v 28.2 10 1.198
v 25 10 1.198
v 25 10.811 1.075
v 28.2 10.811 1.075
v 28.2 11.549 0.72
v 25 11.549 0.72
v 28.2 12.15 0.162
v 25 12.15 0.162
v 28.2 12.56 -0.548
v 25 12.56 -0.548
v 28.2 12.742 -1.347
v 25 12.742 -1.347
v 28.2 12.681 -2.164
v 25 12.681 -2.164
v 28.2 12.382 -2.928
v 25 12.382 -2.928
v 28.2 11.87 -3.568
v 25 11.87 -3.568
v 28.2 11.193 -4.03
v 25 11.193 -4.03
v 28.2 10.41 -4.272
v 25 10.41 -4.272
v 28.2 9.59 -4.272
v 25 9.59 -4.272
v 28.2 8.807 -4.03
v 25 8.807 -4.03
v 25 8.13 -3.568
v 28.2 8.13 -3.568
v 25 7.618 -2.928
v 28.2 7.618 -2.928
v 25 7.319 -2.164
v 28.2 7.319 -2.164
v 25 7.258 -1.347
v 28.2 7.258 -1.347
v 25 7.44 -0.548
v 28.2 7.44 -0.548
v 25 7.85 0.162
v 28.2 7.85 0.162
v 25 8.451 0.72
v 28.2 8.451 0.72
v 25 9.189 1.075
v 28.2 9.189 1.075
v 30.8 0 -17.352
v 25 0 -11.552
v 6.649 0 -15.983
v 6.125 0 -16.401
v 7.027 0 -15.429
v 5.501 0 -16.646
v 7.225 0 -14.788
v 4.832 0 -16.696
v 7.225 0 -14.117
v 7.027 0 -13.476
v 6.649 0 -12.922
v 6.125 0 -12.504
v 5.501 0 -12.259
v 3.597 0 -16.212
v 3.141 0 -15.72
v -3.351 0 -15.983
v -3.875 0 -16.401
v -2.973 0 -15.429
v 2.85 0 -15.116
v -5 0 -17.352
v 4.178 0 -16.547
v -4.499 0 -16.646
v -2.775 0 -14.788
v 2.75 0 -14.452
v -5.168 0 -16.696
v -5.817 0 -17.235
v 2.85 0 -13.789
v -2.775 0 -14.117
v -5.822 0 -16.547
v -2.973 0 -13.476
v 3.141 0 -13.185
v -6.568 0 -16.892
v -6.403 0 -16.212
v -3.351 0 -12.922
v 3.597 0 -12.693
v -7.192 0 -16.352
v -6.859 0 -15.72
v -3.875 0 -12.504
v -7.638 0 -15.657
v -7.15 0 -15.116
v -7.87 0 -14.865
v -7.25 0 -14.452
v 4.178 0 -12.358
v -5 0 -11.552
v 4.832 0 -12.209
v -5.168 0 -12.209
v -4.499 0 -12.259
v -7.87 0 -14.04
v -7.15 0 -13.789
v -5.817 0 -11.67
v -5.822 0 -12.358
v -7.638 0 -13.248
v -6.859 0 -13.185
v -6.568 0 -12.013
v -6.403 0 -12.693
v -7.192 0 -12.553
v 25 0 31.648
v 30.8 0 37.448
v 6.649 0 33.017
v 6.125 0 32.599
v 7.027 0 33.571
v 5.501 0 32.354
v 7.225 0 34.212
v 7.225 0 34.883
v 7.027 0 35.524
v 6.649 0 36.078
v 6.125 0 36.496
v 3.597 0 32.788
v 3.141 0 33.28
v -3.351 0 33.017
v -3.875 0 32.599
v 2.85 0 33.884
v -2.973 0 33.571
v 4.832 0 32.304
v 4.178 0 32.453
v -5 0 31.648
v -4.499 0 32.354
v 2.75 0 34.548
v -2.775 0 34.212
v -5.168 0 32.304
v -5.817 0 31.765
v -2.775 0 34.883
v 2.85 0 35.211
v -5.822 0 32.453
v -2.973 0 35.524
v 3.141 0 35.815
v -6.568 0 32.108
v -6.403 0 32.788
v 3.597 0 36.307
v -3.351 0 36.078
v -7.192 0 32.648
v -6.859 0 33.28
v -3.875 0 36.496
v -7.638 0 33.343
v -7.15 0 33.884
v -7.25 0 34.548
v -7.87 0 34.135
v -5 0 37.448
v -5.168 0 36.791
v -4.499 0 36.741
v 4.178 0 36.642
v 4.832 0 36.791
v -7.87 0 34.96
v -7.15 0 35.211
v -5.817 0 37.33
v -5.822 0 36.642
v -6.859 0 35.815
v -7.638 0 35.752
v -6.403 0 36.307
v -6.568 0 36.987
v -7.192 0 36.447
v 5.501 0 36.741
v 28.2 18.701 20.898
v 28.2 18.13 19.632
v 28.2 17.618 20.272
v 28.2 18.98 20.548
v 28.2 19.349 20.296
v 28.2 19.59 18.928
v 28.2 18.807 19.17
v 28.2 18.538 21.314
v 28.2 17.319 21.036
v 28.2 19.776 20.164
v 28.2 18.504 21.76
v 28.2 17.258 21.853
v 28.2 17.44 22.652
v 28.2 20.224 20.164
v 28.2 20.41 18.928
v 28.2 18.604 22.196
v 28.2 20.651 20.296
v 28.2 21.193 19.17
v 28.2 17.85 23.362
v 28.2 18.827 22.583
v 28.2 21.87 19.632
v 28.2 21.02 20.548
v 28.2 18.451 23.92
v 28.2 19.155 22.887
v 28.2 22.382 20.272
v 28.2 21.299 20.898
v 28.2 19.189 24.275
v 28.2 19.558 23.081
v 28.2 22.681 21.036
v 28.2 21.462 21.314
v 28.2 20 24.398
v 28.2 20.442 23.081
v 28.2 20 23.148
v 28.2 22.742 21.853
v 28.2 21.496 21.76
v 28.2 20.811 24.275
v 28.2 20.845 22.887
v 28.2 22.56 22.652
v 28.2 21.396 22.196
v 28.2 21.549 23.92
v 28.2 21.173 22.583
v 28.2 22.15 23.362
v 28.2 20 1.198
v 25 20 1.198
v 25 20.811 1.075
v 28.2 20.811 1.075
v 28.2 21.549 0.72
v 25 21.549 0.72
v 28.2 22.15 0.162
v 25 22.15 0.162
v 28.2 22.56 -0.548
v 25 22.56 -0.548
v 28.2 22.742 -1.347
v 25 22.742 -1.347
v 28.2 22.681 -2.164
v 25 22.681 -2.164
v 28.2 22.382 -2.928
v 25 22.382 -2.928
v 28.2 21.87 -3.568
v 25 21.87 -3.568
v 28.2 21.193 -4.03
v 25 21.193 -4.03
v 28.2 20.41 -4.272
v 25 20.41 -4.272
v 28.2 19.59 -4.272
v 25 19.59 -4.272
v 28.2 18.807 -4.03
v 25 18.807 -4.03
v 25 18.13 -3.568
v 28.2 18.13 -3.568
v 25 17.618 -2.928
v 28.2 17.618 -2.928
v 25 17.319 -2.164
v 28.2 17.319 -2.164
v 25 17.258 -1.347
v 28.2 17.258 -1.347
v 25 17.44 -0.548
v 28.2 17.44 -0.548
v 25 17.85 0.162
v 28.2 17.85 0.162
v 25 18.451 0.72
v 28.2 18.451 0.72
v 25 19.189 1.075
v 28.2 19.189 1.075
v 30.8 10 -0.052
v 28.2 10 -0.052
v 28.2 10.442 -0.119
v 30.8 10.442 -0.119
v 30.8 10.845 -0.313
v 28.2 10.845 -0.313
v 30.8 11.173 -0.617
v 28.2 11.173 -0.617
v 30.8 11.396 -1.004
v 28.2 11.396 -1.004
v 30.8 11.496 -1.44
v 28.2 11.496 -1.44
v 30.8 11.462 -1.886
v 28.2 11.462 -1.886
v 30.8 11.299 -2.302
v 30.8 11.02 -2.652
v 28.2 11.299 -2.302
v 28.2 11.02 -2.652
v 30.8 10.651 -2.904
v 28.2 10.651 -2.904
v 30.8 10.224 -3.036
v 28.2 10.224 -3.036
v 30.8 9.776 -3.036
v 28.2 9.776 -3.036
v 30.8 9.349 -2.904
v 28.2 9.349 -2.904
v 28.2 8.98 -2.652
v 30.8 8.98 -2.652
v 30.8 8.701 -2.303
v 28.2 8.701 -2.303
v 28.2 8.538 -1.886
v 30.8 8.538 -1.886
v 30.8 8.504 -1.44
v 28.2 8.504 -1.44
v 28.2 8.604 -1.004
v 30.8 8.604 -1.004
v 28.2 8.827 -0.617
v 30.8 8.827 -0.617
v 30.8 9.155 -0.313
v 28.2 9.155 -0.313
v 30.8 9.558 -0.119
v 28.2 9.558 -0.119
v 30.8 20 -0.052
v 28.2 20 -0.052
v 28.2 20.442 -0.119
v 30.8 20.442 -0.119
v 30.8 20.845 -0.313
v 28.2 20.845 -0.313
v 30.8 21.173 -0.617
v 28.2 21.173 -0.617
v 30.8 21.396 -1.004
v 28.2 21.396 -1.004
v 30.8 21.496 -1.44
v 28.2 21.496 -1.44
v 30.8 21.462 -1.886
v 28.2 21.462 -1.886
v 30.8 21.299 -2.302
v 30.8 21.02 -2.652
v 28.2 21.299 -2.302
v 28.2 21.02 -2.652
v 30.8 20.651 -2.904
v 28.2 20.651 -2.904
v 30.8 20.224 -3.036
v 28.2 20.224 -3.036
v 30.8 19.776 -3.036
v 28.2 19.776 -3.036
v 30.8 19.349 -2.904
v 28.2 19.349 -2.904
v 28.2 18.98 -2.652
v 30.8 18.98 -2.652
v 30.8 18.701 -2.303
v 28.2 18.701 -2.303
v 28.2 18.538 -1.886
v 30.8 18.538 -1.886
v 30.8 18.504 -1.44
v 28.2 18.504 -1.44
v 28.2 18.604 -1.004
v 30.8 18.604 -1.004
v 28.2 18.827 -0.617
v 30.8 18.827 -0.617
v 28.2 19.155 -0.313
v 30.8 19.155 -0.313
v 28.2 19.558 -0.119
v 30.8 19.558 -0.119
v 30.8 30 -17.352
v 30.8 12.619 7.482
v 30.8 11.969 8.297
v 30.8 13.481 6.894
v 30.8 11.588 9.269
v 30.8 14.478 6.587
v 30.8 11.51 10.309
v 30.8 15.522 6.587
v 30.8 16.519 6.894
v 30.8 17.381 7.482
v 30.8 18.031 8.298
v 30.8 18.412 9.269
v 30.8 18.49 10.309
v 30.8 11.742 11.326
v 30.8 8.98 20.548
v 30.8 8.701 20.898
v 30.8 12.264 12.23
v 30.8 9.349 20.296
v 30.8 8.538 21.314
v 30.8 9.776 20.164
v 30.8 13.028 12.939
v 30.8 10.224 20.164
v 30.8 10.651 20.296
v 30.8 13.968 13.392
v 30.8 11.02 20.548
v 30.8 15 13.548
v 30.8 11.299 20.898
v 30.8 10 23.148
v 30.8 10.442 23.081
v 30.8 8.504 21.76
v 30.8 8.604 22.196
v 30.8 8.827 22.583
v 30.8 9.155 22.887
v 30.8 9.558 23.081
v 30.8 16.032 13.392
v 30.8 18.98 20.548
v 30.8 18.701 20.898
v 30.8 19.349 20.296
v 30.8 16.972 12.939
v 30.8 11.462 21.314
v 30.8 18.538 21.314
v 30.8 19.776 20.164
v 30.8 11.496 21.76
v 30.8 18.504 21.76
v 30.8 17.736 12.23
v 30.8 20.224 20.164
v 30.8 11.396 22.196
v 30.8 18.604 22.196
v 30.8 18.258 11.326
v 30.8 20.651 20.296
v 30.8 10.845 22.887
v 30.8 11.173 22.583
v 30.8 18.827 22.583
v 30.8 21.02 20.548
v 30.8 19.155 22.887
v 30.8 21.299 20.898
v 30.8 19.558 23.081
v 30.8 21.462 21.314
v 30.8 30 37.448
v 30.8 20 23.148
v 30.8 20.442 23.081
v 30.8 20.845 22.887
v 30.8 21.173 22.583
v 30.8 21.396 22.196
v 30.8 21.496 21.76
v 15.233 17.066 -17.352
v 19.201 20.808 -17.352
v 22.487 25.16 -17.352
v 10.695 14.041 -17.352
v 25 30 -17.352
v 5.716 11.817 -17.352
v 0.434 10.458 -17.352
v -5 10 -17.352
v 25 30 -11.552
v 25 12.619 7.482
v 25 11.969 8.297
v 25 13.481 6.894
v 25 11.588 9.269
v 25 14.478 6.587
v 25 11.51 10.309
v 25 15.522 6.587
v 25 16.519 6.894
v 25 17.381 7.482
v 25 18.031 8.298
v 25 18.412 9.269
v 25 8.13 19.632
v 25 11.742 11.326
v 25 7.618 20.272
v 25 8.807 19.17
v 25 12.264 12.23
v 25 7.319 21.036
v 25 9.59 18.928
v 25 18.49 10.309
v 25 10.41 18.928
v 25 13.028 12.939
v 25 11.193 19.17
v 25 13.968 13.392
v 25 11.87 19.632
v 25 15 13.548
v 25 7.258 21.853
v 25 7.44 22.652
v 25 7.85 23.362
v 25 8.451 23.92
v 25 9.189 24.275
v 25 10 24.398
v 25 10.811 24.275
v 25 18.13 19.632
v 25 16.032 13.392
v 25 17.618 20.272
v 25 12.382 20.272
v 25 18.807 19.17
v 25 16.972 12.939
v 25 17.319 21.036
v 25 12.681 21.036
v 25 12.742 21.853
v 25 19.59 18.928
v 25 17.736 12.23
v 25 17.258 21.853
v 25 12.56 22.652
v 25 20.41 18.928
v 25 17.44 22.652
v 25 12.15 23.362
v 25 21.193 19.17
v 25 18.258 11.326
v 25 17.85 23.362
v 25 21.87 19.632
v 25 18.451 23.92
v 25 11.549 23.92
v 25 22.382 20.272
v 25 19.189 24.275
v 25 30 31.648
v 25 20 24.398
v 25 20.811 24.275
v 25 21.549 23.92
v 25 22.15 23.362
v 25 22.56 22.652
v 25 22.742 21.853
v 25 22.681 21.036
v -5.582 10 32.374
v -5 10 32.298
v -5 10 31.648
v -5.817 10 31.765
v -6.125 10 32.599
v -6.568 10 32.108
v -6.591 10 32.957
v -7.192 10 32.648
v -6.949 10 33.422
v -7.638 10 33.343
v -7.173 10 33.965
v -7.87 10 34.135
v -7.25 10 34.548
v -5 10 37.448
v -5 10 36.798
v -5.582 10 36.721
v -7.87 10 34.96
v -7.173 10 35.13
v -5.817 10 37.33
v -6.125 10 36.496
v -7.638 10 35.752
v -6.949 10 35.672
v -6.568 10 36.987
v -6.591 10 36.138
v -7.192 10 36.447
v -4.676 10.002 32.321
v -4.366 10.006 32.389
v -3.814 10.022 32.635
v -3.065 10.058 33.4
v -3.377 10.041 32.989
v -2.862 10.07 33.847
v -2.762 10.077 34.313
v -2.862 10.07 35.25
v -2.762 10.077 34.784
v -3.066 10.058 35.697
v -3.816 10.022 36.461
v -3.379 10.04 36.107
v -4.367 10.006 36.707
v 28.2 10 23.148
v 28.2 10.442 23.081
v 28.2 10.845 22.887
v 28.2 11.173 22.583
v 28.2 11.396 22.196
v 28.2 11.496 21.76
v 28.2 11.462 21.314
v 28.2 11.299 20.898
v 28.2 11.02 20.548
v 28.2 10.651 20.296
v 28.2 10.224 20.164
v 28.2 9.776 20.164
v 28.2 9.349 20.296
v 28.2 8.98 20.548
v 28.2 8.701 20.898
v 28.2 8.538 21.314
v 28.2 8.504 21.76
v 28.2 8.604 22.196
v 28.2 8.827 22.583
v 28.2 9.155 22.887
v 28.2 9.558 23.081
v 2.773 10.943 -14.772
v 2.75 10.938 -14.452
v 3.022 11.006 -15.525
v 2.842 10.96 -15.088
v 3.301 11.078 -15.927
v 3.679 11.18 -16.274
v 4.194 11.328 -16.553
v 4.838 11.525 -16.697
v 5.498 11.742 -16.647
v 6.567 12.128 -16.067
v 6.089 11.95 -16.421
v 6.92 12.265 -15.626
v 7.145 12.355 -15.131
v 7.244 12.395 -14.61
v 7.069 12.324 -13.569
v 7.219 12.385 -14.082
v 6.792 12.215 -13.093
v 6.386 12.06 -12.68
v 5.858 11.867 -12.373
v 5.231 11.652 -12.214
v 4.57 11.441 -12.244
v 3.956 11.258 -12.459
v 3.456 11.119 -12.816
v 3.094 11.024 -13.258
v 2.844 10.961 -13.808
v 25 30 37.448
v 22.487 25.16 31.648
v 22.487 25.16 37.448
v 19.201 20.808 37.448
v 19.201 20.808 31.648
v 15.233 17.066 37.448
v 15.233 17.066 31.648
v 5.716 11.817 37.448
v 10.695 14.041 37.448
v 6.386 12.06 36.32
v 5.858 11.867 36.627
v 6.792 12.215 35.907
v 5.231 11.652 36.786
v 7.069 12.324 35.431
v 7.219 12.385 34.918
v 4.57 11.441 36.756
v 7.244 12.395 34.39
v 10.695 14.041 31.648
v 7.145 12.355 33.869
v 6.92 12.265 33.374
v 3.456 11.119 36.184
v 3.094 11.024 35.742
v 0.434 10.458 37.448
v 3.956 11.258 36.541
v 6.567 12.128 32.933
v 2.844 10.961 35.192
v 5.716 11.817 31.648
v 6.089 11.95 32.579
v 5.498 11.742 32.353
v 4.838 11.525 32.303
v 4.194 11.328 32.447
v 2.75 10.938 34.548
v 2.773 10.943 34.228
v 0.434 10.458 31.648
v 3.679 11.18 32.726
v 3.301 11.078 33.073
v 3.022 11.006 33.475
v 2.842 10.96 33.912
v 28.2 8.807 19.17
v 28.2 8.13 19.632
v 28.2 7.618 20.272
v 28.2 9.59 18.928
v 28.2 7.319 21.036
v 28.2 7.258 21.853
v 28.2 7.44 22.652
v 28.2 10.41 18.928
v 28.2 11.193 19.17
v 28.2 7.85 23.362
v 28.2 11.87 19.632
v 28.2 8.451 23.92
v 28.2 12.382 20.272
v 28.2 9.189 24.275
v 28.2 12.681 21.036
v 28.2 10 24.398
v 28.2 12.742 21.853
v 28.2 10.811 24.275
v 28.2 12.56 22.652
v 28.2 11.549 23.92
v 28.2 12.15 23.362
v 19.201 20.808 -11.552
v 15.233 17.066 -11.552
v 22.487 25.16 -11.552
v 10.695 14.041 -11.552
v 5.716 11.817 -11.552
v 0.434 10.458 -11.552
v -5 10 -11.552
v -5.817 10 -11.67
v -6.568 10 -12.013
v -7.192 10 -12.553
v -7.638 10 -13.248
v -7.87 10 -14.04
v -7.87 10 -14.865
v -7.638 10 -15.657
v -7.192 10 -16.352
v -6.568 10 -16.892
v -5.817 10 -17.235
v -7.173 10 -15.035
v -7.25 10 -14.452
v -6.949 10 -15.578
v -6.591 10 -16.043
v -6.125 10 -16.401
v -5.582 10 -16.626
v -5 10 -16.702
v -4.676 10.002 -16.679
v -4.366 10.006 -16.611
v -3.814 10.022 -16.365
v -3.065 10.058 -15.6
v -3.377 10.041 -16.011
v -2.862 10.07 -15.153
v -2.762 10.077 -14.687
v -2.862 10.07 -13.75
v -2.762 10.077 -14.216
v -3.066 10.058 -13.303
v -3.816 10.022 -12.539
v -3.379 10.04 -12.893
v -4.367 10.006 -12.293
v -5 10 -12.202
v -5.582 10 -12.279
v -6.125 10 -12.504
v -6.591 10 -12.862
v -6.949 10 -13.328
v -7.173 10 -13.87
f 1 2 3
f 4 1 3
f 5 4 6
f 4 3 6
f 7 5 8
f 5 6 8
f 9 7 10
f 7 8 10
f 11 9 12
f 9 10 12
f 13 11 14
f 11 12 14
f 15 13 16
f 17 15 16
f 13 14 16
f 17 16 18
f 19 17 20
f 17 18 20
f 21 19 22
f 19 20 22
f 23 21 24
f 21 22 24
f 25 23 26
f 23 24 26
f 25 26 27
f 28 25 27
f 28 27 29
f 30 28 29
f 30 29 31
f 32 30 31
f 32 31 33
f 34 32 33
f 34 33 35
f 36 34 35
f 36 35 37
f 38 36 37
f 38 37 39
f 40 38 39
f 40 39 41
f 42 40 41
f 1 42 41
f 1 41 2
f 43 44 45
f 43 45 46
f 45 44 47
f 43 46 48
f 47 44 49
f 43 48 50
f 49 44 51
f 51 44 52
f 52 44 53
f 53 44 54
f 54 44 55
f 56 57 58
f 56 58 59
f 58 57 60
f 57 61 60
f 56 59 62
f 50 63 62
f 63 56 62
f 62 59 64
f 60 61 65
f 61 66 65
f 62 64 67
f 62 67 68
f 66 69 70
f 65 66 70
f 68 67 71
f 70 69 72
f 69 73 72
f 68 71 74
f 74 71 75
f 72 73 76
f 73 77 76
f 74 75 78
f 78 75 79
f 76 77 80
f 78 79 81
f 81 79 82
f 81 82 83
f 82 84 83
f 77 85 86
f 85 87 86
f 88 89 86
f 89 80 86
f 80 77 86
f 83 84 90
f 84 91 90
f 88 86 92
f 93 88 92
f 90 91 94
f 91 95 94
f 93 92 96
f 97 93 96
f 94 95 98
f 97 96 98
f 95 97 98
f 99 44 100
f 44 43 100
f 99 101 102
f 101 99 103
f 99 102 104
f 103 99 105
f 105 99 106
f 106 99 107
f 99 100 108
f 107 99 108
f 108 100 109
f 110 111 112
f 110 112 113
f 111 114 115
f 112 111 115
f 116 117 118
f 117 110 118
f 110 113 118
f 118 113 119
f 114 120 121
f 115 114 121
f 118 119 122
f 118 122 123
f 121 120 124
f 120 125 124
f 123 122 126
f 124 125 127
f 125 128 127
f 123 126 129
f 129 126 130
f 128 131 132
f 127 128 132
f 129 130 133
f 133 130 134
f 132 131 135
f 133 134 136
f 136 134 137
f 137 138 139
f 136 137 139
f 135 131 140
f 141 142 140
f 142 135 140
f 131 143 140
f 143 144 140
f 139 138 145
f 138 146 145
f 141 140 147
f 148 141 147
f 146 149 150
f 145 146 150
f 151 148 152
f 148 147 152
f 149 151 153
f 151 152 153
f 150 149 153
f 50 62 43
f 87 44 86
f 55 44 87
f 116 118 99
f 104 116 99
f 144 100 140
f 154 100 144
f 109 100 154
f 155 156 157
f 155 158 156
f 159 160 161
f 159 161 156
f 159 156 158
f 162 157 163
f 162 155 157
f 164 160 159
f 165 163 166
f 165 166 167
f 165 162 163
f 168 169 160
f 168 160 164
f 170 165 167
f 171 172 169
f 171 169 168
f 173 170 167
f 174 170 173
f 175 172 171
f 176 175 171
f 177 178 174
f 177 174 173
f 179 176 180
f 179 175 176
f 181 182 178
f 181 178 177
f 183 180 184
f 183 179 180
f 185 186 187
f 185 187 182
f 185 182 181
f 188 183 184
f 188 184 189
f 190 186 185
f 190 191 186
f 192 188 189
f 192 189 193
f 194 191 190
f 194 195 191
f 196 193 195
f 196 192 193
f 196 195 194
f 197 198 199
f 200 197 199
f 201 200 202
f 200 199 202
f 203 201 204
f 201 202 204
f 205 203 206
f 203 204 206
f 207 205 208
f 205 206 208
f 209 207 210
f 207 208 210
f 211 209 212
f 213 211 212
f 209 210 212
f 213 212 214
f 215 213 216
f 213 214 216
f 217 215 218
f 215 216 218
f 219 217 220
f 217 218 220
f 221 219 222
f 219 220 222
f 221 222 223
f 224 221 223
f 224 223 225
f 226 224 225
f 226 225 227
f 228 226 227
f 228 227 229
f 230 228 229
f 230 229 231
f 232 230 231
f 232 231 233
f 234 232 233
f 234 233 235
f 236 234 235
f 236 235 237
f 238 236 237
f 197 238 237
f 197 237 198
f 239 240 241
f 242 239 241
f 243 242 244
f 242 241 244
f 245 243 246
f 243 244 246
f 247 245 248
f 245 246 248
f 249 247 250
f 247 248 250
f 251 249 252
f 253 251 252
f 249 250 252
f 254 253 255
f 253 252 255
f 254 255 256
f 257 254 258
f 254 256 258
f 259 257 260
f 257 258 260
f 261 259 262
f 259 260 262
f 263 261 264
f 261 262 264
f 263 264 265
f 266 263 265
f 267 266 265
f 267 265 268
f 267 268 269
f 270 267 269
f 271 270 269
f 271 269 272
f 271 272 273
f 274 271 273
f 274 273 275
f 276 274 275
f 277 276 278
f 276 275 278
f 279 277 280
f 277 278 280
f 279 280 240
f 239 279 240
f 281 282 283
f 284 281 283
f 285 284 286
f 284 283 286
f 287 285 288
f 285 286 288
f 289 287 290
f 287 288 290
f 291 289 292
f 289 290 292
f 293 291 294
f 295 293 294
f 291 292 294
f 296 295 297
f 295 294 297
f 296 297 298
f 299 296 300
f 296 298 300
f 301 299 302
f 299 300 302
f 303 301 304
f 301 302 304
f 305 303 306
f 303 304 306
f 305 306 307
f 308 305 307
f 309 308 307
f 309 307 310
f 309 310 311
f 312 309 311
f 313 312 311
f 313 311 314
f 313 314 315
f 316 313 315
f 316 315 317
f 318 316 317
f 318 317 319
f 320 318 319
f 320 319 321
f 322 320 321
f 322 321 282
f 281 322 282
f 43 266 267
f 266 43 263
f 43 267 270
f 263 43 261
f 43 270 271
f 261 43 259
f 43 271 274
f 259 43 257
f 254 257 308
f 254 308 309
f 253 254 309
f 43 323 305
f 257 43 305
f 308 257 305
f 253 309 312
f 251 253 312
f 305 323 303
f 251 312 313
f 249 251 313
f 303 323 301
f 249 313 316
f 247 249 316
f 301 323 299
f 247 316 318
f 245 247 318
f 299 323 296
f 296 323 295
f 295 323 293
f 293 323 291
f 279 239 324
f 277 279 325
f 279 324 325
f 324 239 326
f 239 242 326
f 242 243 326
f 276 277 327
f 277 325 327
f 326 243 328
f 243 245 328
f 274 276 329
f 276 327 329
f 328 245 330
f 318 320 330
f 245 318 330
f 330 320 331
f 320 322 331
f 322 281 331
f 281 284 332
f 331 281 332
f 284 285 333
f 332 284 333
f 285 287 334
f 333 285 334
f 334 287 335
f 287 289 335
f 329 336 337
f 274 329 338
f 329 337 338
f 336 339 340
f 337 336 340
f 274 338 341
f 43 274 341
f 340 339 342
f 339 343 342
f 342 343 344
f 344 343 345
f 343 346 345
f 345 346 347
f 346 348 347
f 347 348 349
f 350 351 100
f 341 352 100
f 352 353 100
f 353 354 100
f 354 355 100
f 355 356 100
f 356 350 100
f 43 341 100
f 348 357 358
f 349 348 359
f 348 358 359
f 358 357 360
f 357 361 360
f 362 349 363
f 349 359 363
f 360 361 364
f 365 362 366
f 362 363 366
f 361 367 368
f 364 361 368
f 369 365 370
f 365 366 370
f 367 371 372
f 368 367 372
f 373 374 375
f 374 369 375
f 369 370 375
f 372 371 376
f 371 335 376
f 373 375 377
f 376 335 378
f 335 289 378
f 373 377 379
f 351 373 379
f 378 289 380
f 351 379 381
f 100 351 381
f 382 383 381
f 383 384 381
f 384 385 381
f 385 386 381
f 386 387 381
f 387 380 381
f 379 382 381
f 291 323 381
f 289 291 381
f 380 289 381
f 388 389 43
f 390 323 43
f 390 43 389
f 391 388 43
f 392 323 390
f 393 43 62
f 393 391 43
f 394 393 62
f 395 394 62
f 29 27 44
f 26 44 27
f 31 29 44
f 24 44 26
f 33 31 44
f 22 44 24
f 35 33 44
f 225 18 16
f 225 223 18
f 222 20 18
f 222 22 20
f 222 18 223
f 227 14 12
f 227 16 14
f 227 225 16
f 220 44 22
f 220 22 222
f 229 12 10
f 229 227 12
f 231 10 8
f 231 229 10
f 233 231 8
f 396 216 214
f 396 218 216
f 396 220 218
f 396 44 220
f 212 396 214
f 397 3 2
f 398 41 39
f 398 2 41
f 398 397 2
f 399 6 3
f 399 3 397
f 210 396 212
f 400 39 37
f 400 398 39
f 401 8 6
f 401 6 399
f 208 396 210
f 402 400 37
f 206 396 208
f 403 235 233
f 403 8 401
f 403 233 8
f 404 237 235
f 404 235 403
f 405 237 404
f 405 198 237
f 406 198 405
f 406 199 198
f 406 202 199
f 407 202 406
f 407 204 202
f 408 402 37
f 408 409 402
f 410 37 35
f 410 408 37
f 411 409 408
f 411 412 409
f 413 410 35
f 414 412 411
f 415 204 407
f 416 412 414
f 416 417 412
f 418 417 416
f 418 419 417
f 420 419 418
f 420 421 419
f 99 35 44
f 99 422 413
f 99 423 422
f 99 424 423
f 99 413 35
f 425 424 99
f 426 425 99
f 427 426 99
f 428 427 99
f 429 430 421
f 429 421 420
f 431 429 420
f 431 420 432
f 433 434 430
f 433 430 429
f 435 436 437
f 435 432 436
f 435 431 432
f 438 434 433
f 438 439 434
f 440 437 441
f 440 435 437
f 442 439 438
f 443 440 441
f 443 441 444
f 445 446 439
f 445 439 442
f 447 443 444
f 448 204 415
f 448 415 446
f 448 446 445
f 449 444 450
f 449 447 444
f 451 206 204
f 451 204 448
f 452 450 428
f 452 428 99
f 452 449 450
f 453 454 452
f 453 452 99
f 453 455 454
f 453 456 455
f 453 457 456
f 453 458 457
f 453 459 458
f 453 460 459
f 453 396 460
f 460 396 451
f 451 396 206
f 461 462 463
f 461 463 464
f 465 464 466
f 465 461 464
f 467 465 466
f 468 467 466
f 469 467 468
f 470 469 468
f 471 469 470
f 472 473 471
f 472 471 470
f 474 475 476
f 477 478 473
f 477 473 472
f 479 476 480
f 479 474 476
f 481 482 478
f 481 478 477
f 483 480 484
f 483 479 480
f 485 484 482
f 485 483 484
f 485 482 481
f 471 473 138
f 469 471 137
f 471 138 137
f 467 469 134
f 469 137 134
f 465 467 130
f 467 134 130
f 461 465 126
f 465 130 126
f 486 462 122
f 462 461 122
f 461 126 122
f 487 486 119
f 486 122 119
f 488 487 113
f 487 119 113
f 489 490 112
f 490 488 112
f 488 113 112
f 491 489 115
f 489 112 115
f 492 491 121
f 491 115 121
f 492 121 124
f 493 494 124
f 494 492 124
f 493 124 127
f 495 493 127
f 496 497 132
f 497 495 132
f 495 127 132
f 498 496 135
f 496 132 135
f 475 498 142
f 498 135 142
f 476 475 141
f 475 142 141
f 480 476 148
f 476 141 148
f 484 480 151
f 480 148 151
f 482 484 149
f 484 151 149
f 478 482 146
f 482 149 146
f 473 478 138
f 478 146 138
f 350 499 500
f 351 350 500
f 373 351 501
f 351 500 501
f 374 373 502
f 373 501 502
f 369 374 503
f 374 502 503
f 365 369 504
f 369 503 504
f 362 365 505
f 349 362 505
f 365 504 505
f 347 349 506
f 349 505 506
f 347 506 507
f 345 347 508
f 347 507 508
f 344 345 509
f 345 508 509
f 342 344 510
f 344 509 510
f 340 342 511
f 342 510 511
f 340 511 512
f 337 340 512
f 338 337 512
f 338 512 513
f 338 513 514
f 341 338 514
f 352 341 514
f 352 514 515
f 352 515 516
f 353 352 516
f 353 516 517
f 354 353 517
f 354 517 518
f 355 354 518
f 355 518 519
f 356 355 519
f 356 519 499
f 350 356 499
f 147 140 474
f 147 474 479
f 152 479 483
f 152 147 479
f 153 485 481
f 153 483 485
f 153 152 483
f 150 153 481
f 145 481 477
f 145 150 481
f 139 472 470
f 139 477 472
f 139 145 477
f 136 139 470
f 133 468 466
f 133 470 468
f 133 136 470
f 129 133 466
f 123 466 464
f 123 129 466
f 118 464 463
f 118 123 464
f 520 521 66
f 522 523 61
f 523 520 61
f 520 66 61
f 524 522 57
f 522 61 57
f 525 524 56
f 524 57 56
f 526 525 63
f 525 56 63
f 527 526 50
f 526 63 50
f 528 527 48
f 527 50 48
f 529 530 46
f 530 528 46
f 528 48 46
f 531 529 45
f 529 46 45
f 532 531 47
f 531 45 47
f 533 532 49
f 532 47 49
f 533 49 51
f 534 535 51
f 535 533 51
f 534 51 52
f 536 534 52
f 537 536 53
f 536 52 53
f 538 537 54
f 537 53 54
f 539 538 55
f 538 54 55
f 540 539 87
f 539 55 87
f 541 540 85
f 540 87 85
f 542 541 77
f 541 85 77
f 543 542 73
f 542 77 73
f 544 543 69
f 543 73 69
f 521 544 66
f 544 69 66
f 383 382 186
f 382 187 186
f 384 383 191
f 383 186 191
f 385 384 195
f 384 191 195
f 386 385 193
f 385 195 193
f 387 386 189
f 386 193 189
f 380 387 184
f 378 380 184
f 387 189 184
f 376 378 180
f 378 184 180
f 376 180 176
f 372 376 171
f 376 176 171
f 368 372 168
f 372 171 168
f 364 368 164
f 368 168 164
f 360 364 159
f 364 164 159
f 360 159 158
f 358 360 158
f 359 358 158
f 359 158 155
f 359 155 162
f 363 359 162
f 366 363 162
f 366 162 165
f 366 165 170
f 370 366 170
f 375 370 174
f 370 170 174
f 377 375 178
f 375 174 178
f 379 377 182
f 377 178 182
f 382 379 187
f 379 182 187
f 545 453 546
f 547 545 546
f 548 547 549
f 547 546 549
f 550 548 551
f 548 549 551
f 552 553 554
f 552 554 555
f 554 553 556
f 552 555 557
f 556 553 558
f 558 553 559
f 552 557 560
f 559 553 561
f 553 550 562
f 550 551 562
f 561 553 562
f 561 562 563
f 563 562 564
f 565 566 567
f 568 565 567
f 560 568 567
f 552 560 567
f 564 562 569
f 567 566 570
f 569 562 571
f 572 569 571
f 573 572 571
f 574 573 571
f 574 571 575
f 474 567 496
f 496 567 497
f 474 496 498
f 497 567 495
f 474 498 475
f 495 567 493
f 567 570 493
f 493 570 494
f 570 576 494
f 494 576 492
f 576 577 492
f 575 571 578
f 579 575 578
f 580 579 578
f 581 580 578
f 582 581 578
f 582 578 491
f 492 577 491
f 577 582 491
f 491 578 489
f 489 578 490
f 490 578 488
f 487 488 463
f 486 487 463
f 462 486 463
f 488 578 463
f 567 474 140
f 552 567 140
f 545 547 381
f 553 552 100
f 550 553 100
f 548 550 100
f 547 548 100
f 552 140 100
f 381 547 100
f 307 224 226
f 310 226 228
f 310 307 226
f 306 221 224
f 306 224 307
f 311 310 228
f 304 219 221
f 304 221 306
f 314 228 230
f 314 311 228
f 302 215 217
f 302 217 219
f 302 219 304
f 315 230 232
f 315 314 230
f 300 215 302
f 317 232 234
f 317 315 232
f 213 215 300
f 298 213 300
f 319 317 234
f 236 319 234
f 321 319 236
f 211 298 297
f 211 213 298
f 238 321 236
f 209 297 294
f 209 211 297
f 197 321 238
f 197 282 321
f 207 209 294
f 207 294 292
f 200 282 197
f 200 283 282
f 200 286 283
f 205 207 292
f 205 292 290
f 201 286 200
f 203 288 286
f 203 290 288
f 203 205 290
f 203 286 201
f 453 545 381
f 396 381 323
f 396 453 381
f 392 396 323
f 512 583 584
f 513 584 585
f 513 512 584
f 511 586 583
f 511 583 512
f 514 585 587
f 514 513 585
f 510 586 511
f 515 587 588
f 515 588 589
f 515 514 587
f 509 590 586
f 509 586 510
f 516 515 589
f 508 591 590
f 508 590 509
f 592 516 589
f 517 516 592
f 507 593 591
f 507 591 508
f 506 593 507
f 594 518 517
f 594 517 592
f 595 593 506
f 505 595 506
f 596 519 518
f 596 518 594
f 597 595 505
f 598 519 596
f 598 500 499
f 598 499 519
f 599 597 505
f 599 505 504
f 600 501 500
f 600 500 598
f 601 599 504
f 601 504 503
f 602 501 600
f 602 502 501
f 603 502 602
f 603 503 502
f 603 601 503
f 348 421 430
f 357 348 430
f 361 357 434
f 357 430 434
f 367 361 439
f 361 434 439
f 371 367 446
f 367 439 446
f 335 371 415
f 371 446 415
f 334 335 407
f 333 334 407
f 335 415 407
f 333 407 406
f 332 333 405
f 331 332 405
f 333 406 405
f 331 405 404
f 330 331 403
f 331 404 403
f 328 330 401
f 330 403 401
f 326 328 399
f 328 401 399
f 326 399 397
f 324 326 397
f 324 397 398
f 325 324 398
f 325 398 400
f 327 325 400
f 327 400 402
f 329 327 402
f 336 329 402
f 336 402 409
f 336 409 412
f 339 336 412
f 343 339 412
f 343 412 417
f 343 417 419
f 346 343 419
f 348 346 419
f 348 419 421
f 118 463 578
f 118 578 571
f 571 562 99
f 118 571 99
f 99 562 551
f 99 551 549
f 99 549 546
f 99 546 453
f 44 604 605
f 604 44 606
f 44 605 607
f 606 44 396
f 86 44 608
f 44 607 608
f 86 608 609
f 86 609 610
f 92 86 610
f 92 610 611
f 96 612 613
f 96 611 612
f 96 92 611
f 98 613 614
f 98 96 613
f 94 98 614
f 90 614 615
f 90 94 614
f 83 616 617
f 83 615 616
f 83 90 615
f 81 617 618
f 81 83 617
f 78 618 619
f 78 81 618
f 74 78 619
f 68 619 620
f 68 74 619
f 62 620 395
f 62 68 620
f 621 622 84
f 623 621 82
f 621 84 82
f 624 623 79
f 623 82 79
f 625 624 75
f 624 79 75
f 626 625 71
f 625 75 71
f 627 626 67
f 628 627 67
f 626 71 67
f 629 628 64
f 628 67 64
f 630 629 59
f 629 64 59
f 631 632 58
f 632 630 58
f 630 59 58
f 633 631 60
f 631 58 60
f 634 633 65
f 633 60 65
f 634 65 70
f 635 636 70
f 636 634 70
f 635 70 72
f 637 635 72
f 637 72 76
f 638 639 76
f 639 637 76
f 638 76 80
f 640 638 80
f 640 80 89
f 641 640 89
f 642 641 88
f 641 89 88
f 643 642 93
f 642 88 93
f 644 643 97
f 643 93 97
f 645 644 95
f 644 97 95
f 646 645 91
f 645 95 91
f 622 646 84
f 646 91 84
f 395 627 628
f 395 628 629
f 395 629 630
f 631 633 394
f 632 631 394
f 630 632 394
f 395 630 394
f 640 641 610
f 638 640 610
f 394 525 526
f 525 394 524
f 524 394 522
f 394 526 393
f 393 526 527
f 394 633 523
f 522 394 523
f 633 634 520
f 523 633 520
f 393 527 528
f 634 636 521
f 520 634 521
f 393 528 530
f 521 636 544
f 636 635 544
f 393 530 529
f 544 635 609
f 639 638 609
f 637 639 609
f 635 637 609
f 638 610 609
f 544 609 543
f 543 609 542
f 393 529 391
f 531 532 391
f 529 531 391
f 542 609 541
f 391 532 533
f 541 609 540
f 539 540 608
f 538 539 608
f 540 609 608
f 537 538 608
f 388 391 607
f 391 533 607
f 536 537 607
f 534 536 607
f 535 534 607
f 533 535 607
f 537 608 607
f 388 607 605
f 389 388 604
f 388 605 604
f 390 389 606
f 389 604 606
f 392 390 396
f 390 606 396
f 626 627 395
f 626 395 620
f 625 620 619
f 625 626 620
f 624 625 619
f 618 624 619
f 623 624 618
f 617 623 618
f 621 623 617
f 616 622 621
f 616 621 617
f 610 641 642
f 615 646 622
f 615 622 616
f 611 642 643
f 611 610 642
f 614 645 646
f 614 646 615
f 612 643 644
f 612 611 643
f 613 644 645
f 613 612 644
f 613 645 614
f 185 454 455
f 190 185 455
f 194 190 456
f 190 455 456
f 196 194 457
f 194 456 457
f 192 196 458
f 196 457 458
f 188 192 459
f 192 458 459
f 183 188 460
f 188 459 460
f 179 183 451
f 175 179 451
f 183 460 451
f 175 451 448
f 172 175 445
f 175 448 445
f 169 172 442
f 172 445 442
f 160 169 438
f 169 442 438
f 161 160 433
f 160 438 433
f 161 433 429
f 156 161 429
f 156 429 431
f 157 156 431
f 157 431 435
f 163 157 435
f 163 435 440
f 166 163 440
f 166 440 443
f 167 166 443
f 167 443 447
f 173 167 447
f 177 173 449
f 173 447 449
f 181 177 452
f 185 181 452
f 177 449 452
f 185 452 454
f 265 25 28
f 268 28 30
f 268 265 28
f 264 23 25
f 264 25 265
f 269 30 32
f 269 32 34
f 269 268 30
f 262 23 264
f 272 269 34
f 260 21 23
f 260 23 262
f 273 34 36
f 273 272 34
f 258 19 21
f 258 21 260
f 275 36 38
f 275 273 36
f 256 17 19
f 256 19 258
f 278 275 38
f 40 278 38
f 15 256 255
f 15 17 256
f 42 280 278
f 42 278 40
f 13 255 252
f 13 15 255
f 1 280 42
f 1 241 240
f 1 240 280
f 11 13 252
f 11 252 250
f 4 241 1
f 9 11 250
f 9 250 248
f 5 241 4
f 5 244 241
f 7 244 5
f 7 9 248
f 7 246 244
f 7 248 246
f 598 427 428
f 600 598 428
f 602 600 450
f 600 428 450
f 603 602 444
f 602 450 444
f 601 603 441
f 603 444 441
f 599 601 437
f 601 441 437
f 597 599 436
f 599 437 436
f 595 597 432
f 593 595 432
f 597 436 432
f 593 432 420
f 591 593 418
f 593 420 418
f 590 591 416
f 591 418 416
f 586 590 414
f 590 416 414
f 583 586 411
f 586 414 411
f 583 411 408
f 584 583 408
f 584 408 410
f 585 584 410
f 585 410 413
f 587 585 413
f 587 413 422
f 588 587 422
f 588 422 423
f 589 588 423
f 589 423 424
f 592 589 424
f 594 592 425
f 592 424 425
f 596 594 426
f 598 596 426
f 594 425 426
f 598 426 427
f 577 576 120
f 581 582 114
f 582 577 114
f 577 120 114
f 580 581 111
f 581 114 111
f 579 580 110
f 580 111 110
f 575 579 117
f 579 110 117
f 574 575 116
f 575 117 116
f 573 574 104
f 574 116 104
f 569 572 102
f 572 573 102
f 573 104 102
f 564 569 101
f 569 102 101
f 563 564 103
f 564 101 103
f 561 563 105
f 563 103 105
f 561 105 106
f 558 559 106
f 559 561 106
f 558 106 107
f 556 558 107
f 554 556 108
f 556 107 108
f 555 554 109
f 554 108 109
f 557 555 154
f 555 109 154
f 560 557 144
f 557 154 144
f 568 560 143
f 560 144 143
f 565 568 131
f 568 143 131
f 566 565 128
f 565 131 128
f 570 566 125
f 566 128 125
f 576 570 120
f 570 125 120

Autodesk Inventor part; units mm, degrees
ref_plane "YZ Plane" through (0, 0, 0) normal (1, 0, 0) x (0, 1, 0)
ref_plane "XZ Plane" through (0, 0, 0) normal (0, 1, 0) x (-1, 0, 0)
sketch "Sketch1" plane through (0, 0, 0) normal (0, 1, 0) x (-1, 0, 0)
  circle A0 centre (-5, -14.4525) radius 2.25
  circle A1 centre (5, -14.4525) radius 2.25
  circle A2 centre (5, 34.5475) radius 2.25
  circle A3 centre (-5, 34.5475) radius 2.25
  line L0 (21.75, 43.0475) -> (-21.75, 43.0475)
  line L1 (21.75, -42.9525) -> (21.75, 43.0475)
  line L2 (-21.75, 43.0475) -> (-21.75, -42.9525)
  line L3 (-21.75, 43.0475) -> (21.75, 43.0475)
  line L4 (21.75, 43.0475) -> (21.75, -42.9525)
  line L5 (21.75, -42.9525) -> (-21.75, -42.9525)
  line L6 (-21.75, -42.9525) -> (-21.75, 43.0475)
  circle A4 centre (-5, 34.5475) radius 2.9
  circle A5 centre (5, 34.5475) radius 2.9
  circle A6 centre (-5, -14.4525) radius 2.9
  circle A7 centre (5, -14.4525) radius 2.9
  line L7 (5, 37.4475) -> (-5, 37.4475)
  line L8 (5, 31.6475) -> (-5, 31.6475)
  line L9 (5, -11.5525) -> (-5, -11.5525)
  line L10 (5, -17.3525) -> (-5, -17.3525)
  line L11 (-5, 37.4475) -> (-30.8, 37.4475)
  line L12 (-5, -17.3525) -> (-30.8, -17.3525)
  line L13 (-30.8, -17.3525) -> (-30.8, 37.4475)
  line L14 (-5, 31.6475) -> (-25, 31.6475)
  line L15 (-25, 31.6475) -> (-25, -11.5525)
  line L16 (-25, -11.5525) -> (-5, -11.5525)
  point P0 (0, 0)
  point P1 (-1.4735, -1.6316)
  dimension "d0" = 5.8
  dimension "d1" = 5.8
  dimension "d2" = 5.8
  dimension "d3" = 5.8
  dimension "d4" = 4.5
  dimension "d5" = 4.5
  dimension "d6" = 4.5
  dimension "d7" = 4.5
  dimension "d8" = 25.8
  dimension "d9" = 20
extrude "Extrusion1" add sketch "Sketch1" along normal blind 10 contours L11 A4 L14 L2 | L2 L14 L15 L16 L12 L13 L11 | L7 A5 L8 A4 | A4 | L2 L16 A6 L12 | A5 | A6 | A6 L9 A7 L10 | A7
sketch "Sketch2" plane through (25, 0, -11.5525) normal (-1, 0, 0) x (0, 0, 1)
  line L0 (0, 0) -> (0, 10) projected
  line L1 (43.2, 0) -> (43.2, 10) projected
  line L2 (0, 10) -> (43.2, 10)
  line L3 (43.2, 10) -> (43.2, 30)
  line L4 (43.2, 30) -> (0, 30)
  line L5 (0, 30) -> (0, 10)
  point P0 (11.5525, 0)
  dimension "d12" = 20
extrude "Extrusion2" add sketch "Sketch2" against normal up to surface (5.8 mm away)
sketch "Sketch3" plane through (25, 0, -11.5525) normal (-1, 0, 0) x (0, 0, 1)
  line L0 (0, 0) -> (43.2, 0) projected
  line L1 (43.2, 0) -> (43.2, 10) projected
  line L2 (43.2, 10) -> (43.2, 30) projected
  line L3 (43.2, 30) -> (0, 30) projected
  line L4 (0, 30) -> (0, 10) projected
  line L5 (0, 0) -> (0, 10) projected
  circle A0 centre (10, 10) radius 2.75
  line L6 (0, 30) -> (43.2, 30)
  line L7 (43.2, 30) -> (43.2, 0)
  line L8 (43.2, 0) -> (0, 0)
  line L9 (0, 0) -> (0, 30)
  circle A1 centre (10, 20) radius 2.75
  circle A2 centre (33.2, 20) radius 2.75
  circle A3 centre (33.2, 10) radius 2.75
  point P0 (11.5525, 0)
  dimension "d15" = 5.5
  dimension "d16" = 10
  dimension "d17" = 10
  dimension "d18" = 5.5
  dimension "d19" = 5.5
  dimension "d20" = 10
  dimension "d21" = 5.5
  dimension "d22" = 43.2
  dimension "d23" = 30
extrude "Extrusion3" cut sketch "Sketch3" against normal blind 3.2 contours A0 | A1 | A2 | A3
sketch "Sketch4" plane through (25, 0, -11.5525) normal (-1, 0, 0) x (0, 0, 1)
  circle A0 centre (10, 10) radius 2.75 projected
  circle A1 centre (10, 10) radius 1.5
  circle A2 centre (10, 20) radius 2.75 projected
  circle A3 centre (10, 20) radius 1.5
  circle A4 centre (33.2, 10) radius 2.75 projected
  circle A5 centre (33.2, 20) radius 2.75 projected
  circle A6 centre (33.2, 10) radius 1.5
  circle A7 centre (33.2, 20) radius 1.5
  point P0 (11.5525, 0)
  dimension "d26" = 3
  dimension "d27" = 3
  dimension "d28" = 3
  dimension "d29" = 3
extrude "Extrusion4" cut sketch "Sketch4" against normal blind 10 contours A1 | A3 | A6 | A7
sketch "Sketch5" plane through (25, 10, 31.6475) normal (0, 0, 1) x (1, 0, 0)
  line L0 (3.2, 7.25) -> (3.2, 12.75) projected
  line L1 (5.8, 0) -> (5.8, 20) projected
  line L2 (0, 20) -> (5.8, 20) projected
  line L3 (0, 0) -> (0, 20) projected
  line L4 (5.8, 0) -> (0, 0) projected
  line L5 (-30, -10) -> (5.8, -10) projected
  line L6 (5.8, -10) -> (5.8, 0) projected
  line L7 (-30, 0) -> (5.8, 0) projected
  line L8 (-30, -10) -> (-30, 0) projected
  line L9 (-30, -10) -> (-30, 0) projected
  arc A0 (-30, 0) -> (0, 20) centre (-30, 32.5) ccw
  line L10 (-30, 0) -> (5.8, 0) projected
  line L11 (-30, 0) -> (0, 0)
  line L12 (-32.9, -10) -> (-32.9, 0) projected
  line L13 (0, 20) -> (0, 0)
  point P0 (-25, -10)
extrude "Extrusion5" add sketch "Sketch5" along normal up to surface (5.8 mm away) contours L4 L3 L2 L1 | L7 A0 L3
ref_plane "Work Plane1" through (25, 10, 10.0475) normal (0, 0, -1) x (-1, 0, 0)
mirror "Mirror1" about plane through (25, 10, 10.0475) normal (0, 0, -1) of "Extrusion5"
extrude "Extrusion6" cut sketch "Sketch1" along normal blind 33.8125 contours A0 | A1 | A2 | A3
sketch "Sketch6" plane through (25, 0, -11.5525) normal (-1, 0, 0) x (0, 0, 1)
  circle A0 centre (33.2, 10) radius 2.75 projected
  circle A1 centre (10, 10) radius 2.75 projected
  circle A2 centre (33.2, 20) radius 2.75 projected
  circle A3 centre (10, 20) radius 2.75 projected
  line L0 (0, 0) -> (43.2, 0) projected
  line L1 (43.2, 0) -> (43.2, 30) projected
  line L2 (43.2, 30) -> (0, 30) projected
  line L3 (0, 0) -> (0, 30) projected
  line L4 (10, 20) -> (33.2, 10) construction
  line L5 (33.2, 20) -> (10, 10) construction
  circle A4 centre (21.6, 15) radius 3.5
  point P0 (11.5525, 0)
  dimension "d37" = 7
extrude "Extrusion7" cut sketch "Sketch6" against normal through all contours A4
properties part number "SERVO_TO_TOOLHEAD_3DPrint"
